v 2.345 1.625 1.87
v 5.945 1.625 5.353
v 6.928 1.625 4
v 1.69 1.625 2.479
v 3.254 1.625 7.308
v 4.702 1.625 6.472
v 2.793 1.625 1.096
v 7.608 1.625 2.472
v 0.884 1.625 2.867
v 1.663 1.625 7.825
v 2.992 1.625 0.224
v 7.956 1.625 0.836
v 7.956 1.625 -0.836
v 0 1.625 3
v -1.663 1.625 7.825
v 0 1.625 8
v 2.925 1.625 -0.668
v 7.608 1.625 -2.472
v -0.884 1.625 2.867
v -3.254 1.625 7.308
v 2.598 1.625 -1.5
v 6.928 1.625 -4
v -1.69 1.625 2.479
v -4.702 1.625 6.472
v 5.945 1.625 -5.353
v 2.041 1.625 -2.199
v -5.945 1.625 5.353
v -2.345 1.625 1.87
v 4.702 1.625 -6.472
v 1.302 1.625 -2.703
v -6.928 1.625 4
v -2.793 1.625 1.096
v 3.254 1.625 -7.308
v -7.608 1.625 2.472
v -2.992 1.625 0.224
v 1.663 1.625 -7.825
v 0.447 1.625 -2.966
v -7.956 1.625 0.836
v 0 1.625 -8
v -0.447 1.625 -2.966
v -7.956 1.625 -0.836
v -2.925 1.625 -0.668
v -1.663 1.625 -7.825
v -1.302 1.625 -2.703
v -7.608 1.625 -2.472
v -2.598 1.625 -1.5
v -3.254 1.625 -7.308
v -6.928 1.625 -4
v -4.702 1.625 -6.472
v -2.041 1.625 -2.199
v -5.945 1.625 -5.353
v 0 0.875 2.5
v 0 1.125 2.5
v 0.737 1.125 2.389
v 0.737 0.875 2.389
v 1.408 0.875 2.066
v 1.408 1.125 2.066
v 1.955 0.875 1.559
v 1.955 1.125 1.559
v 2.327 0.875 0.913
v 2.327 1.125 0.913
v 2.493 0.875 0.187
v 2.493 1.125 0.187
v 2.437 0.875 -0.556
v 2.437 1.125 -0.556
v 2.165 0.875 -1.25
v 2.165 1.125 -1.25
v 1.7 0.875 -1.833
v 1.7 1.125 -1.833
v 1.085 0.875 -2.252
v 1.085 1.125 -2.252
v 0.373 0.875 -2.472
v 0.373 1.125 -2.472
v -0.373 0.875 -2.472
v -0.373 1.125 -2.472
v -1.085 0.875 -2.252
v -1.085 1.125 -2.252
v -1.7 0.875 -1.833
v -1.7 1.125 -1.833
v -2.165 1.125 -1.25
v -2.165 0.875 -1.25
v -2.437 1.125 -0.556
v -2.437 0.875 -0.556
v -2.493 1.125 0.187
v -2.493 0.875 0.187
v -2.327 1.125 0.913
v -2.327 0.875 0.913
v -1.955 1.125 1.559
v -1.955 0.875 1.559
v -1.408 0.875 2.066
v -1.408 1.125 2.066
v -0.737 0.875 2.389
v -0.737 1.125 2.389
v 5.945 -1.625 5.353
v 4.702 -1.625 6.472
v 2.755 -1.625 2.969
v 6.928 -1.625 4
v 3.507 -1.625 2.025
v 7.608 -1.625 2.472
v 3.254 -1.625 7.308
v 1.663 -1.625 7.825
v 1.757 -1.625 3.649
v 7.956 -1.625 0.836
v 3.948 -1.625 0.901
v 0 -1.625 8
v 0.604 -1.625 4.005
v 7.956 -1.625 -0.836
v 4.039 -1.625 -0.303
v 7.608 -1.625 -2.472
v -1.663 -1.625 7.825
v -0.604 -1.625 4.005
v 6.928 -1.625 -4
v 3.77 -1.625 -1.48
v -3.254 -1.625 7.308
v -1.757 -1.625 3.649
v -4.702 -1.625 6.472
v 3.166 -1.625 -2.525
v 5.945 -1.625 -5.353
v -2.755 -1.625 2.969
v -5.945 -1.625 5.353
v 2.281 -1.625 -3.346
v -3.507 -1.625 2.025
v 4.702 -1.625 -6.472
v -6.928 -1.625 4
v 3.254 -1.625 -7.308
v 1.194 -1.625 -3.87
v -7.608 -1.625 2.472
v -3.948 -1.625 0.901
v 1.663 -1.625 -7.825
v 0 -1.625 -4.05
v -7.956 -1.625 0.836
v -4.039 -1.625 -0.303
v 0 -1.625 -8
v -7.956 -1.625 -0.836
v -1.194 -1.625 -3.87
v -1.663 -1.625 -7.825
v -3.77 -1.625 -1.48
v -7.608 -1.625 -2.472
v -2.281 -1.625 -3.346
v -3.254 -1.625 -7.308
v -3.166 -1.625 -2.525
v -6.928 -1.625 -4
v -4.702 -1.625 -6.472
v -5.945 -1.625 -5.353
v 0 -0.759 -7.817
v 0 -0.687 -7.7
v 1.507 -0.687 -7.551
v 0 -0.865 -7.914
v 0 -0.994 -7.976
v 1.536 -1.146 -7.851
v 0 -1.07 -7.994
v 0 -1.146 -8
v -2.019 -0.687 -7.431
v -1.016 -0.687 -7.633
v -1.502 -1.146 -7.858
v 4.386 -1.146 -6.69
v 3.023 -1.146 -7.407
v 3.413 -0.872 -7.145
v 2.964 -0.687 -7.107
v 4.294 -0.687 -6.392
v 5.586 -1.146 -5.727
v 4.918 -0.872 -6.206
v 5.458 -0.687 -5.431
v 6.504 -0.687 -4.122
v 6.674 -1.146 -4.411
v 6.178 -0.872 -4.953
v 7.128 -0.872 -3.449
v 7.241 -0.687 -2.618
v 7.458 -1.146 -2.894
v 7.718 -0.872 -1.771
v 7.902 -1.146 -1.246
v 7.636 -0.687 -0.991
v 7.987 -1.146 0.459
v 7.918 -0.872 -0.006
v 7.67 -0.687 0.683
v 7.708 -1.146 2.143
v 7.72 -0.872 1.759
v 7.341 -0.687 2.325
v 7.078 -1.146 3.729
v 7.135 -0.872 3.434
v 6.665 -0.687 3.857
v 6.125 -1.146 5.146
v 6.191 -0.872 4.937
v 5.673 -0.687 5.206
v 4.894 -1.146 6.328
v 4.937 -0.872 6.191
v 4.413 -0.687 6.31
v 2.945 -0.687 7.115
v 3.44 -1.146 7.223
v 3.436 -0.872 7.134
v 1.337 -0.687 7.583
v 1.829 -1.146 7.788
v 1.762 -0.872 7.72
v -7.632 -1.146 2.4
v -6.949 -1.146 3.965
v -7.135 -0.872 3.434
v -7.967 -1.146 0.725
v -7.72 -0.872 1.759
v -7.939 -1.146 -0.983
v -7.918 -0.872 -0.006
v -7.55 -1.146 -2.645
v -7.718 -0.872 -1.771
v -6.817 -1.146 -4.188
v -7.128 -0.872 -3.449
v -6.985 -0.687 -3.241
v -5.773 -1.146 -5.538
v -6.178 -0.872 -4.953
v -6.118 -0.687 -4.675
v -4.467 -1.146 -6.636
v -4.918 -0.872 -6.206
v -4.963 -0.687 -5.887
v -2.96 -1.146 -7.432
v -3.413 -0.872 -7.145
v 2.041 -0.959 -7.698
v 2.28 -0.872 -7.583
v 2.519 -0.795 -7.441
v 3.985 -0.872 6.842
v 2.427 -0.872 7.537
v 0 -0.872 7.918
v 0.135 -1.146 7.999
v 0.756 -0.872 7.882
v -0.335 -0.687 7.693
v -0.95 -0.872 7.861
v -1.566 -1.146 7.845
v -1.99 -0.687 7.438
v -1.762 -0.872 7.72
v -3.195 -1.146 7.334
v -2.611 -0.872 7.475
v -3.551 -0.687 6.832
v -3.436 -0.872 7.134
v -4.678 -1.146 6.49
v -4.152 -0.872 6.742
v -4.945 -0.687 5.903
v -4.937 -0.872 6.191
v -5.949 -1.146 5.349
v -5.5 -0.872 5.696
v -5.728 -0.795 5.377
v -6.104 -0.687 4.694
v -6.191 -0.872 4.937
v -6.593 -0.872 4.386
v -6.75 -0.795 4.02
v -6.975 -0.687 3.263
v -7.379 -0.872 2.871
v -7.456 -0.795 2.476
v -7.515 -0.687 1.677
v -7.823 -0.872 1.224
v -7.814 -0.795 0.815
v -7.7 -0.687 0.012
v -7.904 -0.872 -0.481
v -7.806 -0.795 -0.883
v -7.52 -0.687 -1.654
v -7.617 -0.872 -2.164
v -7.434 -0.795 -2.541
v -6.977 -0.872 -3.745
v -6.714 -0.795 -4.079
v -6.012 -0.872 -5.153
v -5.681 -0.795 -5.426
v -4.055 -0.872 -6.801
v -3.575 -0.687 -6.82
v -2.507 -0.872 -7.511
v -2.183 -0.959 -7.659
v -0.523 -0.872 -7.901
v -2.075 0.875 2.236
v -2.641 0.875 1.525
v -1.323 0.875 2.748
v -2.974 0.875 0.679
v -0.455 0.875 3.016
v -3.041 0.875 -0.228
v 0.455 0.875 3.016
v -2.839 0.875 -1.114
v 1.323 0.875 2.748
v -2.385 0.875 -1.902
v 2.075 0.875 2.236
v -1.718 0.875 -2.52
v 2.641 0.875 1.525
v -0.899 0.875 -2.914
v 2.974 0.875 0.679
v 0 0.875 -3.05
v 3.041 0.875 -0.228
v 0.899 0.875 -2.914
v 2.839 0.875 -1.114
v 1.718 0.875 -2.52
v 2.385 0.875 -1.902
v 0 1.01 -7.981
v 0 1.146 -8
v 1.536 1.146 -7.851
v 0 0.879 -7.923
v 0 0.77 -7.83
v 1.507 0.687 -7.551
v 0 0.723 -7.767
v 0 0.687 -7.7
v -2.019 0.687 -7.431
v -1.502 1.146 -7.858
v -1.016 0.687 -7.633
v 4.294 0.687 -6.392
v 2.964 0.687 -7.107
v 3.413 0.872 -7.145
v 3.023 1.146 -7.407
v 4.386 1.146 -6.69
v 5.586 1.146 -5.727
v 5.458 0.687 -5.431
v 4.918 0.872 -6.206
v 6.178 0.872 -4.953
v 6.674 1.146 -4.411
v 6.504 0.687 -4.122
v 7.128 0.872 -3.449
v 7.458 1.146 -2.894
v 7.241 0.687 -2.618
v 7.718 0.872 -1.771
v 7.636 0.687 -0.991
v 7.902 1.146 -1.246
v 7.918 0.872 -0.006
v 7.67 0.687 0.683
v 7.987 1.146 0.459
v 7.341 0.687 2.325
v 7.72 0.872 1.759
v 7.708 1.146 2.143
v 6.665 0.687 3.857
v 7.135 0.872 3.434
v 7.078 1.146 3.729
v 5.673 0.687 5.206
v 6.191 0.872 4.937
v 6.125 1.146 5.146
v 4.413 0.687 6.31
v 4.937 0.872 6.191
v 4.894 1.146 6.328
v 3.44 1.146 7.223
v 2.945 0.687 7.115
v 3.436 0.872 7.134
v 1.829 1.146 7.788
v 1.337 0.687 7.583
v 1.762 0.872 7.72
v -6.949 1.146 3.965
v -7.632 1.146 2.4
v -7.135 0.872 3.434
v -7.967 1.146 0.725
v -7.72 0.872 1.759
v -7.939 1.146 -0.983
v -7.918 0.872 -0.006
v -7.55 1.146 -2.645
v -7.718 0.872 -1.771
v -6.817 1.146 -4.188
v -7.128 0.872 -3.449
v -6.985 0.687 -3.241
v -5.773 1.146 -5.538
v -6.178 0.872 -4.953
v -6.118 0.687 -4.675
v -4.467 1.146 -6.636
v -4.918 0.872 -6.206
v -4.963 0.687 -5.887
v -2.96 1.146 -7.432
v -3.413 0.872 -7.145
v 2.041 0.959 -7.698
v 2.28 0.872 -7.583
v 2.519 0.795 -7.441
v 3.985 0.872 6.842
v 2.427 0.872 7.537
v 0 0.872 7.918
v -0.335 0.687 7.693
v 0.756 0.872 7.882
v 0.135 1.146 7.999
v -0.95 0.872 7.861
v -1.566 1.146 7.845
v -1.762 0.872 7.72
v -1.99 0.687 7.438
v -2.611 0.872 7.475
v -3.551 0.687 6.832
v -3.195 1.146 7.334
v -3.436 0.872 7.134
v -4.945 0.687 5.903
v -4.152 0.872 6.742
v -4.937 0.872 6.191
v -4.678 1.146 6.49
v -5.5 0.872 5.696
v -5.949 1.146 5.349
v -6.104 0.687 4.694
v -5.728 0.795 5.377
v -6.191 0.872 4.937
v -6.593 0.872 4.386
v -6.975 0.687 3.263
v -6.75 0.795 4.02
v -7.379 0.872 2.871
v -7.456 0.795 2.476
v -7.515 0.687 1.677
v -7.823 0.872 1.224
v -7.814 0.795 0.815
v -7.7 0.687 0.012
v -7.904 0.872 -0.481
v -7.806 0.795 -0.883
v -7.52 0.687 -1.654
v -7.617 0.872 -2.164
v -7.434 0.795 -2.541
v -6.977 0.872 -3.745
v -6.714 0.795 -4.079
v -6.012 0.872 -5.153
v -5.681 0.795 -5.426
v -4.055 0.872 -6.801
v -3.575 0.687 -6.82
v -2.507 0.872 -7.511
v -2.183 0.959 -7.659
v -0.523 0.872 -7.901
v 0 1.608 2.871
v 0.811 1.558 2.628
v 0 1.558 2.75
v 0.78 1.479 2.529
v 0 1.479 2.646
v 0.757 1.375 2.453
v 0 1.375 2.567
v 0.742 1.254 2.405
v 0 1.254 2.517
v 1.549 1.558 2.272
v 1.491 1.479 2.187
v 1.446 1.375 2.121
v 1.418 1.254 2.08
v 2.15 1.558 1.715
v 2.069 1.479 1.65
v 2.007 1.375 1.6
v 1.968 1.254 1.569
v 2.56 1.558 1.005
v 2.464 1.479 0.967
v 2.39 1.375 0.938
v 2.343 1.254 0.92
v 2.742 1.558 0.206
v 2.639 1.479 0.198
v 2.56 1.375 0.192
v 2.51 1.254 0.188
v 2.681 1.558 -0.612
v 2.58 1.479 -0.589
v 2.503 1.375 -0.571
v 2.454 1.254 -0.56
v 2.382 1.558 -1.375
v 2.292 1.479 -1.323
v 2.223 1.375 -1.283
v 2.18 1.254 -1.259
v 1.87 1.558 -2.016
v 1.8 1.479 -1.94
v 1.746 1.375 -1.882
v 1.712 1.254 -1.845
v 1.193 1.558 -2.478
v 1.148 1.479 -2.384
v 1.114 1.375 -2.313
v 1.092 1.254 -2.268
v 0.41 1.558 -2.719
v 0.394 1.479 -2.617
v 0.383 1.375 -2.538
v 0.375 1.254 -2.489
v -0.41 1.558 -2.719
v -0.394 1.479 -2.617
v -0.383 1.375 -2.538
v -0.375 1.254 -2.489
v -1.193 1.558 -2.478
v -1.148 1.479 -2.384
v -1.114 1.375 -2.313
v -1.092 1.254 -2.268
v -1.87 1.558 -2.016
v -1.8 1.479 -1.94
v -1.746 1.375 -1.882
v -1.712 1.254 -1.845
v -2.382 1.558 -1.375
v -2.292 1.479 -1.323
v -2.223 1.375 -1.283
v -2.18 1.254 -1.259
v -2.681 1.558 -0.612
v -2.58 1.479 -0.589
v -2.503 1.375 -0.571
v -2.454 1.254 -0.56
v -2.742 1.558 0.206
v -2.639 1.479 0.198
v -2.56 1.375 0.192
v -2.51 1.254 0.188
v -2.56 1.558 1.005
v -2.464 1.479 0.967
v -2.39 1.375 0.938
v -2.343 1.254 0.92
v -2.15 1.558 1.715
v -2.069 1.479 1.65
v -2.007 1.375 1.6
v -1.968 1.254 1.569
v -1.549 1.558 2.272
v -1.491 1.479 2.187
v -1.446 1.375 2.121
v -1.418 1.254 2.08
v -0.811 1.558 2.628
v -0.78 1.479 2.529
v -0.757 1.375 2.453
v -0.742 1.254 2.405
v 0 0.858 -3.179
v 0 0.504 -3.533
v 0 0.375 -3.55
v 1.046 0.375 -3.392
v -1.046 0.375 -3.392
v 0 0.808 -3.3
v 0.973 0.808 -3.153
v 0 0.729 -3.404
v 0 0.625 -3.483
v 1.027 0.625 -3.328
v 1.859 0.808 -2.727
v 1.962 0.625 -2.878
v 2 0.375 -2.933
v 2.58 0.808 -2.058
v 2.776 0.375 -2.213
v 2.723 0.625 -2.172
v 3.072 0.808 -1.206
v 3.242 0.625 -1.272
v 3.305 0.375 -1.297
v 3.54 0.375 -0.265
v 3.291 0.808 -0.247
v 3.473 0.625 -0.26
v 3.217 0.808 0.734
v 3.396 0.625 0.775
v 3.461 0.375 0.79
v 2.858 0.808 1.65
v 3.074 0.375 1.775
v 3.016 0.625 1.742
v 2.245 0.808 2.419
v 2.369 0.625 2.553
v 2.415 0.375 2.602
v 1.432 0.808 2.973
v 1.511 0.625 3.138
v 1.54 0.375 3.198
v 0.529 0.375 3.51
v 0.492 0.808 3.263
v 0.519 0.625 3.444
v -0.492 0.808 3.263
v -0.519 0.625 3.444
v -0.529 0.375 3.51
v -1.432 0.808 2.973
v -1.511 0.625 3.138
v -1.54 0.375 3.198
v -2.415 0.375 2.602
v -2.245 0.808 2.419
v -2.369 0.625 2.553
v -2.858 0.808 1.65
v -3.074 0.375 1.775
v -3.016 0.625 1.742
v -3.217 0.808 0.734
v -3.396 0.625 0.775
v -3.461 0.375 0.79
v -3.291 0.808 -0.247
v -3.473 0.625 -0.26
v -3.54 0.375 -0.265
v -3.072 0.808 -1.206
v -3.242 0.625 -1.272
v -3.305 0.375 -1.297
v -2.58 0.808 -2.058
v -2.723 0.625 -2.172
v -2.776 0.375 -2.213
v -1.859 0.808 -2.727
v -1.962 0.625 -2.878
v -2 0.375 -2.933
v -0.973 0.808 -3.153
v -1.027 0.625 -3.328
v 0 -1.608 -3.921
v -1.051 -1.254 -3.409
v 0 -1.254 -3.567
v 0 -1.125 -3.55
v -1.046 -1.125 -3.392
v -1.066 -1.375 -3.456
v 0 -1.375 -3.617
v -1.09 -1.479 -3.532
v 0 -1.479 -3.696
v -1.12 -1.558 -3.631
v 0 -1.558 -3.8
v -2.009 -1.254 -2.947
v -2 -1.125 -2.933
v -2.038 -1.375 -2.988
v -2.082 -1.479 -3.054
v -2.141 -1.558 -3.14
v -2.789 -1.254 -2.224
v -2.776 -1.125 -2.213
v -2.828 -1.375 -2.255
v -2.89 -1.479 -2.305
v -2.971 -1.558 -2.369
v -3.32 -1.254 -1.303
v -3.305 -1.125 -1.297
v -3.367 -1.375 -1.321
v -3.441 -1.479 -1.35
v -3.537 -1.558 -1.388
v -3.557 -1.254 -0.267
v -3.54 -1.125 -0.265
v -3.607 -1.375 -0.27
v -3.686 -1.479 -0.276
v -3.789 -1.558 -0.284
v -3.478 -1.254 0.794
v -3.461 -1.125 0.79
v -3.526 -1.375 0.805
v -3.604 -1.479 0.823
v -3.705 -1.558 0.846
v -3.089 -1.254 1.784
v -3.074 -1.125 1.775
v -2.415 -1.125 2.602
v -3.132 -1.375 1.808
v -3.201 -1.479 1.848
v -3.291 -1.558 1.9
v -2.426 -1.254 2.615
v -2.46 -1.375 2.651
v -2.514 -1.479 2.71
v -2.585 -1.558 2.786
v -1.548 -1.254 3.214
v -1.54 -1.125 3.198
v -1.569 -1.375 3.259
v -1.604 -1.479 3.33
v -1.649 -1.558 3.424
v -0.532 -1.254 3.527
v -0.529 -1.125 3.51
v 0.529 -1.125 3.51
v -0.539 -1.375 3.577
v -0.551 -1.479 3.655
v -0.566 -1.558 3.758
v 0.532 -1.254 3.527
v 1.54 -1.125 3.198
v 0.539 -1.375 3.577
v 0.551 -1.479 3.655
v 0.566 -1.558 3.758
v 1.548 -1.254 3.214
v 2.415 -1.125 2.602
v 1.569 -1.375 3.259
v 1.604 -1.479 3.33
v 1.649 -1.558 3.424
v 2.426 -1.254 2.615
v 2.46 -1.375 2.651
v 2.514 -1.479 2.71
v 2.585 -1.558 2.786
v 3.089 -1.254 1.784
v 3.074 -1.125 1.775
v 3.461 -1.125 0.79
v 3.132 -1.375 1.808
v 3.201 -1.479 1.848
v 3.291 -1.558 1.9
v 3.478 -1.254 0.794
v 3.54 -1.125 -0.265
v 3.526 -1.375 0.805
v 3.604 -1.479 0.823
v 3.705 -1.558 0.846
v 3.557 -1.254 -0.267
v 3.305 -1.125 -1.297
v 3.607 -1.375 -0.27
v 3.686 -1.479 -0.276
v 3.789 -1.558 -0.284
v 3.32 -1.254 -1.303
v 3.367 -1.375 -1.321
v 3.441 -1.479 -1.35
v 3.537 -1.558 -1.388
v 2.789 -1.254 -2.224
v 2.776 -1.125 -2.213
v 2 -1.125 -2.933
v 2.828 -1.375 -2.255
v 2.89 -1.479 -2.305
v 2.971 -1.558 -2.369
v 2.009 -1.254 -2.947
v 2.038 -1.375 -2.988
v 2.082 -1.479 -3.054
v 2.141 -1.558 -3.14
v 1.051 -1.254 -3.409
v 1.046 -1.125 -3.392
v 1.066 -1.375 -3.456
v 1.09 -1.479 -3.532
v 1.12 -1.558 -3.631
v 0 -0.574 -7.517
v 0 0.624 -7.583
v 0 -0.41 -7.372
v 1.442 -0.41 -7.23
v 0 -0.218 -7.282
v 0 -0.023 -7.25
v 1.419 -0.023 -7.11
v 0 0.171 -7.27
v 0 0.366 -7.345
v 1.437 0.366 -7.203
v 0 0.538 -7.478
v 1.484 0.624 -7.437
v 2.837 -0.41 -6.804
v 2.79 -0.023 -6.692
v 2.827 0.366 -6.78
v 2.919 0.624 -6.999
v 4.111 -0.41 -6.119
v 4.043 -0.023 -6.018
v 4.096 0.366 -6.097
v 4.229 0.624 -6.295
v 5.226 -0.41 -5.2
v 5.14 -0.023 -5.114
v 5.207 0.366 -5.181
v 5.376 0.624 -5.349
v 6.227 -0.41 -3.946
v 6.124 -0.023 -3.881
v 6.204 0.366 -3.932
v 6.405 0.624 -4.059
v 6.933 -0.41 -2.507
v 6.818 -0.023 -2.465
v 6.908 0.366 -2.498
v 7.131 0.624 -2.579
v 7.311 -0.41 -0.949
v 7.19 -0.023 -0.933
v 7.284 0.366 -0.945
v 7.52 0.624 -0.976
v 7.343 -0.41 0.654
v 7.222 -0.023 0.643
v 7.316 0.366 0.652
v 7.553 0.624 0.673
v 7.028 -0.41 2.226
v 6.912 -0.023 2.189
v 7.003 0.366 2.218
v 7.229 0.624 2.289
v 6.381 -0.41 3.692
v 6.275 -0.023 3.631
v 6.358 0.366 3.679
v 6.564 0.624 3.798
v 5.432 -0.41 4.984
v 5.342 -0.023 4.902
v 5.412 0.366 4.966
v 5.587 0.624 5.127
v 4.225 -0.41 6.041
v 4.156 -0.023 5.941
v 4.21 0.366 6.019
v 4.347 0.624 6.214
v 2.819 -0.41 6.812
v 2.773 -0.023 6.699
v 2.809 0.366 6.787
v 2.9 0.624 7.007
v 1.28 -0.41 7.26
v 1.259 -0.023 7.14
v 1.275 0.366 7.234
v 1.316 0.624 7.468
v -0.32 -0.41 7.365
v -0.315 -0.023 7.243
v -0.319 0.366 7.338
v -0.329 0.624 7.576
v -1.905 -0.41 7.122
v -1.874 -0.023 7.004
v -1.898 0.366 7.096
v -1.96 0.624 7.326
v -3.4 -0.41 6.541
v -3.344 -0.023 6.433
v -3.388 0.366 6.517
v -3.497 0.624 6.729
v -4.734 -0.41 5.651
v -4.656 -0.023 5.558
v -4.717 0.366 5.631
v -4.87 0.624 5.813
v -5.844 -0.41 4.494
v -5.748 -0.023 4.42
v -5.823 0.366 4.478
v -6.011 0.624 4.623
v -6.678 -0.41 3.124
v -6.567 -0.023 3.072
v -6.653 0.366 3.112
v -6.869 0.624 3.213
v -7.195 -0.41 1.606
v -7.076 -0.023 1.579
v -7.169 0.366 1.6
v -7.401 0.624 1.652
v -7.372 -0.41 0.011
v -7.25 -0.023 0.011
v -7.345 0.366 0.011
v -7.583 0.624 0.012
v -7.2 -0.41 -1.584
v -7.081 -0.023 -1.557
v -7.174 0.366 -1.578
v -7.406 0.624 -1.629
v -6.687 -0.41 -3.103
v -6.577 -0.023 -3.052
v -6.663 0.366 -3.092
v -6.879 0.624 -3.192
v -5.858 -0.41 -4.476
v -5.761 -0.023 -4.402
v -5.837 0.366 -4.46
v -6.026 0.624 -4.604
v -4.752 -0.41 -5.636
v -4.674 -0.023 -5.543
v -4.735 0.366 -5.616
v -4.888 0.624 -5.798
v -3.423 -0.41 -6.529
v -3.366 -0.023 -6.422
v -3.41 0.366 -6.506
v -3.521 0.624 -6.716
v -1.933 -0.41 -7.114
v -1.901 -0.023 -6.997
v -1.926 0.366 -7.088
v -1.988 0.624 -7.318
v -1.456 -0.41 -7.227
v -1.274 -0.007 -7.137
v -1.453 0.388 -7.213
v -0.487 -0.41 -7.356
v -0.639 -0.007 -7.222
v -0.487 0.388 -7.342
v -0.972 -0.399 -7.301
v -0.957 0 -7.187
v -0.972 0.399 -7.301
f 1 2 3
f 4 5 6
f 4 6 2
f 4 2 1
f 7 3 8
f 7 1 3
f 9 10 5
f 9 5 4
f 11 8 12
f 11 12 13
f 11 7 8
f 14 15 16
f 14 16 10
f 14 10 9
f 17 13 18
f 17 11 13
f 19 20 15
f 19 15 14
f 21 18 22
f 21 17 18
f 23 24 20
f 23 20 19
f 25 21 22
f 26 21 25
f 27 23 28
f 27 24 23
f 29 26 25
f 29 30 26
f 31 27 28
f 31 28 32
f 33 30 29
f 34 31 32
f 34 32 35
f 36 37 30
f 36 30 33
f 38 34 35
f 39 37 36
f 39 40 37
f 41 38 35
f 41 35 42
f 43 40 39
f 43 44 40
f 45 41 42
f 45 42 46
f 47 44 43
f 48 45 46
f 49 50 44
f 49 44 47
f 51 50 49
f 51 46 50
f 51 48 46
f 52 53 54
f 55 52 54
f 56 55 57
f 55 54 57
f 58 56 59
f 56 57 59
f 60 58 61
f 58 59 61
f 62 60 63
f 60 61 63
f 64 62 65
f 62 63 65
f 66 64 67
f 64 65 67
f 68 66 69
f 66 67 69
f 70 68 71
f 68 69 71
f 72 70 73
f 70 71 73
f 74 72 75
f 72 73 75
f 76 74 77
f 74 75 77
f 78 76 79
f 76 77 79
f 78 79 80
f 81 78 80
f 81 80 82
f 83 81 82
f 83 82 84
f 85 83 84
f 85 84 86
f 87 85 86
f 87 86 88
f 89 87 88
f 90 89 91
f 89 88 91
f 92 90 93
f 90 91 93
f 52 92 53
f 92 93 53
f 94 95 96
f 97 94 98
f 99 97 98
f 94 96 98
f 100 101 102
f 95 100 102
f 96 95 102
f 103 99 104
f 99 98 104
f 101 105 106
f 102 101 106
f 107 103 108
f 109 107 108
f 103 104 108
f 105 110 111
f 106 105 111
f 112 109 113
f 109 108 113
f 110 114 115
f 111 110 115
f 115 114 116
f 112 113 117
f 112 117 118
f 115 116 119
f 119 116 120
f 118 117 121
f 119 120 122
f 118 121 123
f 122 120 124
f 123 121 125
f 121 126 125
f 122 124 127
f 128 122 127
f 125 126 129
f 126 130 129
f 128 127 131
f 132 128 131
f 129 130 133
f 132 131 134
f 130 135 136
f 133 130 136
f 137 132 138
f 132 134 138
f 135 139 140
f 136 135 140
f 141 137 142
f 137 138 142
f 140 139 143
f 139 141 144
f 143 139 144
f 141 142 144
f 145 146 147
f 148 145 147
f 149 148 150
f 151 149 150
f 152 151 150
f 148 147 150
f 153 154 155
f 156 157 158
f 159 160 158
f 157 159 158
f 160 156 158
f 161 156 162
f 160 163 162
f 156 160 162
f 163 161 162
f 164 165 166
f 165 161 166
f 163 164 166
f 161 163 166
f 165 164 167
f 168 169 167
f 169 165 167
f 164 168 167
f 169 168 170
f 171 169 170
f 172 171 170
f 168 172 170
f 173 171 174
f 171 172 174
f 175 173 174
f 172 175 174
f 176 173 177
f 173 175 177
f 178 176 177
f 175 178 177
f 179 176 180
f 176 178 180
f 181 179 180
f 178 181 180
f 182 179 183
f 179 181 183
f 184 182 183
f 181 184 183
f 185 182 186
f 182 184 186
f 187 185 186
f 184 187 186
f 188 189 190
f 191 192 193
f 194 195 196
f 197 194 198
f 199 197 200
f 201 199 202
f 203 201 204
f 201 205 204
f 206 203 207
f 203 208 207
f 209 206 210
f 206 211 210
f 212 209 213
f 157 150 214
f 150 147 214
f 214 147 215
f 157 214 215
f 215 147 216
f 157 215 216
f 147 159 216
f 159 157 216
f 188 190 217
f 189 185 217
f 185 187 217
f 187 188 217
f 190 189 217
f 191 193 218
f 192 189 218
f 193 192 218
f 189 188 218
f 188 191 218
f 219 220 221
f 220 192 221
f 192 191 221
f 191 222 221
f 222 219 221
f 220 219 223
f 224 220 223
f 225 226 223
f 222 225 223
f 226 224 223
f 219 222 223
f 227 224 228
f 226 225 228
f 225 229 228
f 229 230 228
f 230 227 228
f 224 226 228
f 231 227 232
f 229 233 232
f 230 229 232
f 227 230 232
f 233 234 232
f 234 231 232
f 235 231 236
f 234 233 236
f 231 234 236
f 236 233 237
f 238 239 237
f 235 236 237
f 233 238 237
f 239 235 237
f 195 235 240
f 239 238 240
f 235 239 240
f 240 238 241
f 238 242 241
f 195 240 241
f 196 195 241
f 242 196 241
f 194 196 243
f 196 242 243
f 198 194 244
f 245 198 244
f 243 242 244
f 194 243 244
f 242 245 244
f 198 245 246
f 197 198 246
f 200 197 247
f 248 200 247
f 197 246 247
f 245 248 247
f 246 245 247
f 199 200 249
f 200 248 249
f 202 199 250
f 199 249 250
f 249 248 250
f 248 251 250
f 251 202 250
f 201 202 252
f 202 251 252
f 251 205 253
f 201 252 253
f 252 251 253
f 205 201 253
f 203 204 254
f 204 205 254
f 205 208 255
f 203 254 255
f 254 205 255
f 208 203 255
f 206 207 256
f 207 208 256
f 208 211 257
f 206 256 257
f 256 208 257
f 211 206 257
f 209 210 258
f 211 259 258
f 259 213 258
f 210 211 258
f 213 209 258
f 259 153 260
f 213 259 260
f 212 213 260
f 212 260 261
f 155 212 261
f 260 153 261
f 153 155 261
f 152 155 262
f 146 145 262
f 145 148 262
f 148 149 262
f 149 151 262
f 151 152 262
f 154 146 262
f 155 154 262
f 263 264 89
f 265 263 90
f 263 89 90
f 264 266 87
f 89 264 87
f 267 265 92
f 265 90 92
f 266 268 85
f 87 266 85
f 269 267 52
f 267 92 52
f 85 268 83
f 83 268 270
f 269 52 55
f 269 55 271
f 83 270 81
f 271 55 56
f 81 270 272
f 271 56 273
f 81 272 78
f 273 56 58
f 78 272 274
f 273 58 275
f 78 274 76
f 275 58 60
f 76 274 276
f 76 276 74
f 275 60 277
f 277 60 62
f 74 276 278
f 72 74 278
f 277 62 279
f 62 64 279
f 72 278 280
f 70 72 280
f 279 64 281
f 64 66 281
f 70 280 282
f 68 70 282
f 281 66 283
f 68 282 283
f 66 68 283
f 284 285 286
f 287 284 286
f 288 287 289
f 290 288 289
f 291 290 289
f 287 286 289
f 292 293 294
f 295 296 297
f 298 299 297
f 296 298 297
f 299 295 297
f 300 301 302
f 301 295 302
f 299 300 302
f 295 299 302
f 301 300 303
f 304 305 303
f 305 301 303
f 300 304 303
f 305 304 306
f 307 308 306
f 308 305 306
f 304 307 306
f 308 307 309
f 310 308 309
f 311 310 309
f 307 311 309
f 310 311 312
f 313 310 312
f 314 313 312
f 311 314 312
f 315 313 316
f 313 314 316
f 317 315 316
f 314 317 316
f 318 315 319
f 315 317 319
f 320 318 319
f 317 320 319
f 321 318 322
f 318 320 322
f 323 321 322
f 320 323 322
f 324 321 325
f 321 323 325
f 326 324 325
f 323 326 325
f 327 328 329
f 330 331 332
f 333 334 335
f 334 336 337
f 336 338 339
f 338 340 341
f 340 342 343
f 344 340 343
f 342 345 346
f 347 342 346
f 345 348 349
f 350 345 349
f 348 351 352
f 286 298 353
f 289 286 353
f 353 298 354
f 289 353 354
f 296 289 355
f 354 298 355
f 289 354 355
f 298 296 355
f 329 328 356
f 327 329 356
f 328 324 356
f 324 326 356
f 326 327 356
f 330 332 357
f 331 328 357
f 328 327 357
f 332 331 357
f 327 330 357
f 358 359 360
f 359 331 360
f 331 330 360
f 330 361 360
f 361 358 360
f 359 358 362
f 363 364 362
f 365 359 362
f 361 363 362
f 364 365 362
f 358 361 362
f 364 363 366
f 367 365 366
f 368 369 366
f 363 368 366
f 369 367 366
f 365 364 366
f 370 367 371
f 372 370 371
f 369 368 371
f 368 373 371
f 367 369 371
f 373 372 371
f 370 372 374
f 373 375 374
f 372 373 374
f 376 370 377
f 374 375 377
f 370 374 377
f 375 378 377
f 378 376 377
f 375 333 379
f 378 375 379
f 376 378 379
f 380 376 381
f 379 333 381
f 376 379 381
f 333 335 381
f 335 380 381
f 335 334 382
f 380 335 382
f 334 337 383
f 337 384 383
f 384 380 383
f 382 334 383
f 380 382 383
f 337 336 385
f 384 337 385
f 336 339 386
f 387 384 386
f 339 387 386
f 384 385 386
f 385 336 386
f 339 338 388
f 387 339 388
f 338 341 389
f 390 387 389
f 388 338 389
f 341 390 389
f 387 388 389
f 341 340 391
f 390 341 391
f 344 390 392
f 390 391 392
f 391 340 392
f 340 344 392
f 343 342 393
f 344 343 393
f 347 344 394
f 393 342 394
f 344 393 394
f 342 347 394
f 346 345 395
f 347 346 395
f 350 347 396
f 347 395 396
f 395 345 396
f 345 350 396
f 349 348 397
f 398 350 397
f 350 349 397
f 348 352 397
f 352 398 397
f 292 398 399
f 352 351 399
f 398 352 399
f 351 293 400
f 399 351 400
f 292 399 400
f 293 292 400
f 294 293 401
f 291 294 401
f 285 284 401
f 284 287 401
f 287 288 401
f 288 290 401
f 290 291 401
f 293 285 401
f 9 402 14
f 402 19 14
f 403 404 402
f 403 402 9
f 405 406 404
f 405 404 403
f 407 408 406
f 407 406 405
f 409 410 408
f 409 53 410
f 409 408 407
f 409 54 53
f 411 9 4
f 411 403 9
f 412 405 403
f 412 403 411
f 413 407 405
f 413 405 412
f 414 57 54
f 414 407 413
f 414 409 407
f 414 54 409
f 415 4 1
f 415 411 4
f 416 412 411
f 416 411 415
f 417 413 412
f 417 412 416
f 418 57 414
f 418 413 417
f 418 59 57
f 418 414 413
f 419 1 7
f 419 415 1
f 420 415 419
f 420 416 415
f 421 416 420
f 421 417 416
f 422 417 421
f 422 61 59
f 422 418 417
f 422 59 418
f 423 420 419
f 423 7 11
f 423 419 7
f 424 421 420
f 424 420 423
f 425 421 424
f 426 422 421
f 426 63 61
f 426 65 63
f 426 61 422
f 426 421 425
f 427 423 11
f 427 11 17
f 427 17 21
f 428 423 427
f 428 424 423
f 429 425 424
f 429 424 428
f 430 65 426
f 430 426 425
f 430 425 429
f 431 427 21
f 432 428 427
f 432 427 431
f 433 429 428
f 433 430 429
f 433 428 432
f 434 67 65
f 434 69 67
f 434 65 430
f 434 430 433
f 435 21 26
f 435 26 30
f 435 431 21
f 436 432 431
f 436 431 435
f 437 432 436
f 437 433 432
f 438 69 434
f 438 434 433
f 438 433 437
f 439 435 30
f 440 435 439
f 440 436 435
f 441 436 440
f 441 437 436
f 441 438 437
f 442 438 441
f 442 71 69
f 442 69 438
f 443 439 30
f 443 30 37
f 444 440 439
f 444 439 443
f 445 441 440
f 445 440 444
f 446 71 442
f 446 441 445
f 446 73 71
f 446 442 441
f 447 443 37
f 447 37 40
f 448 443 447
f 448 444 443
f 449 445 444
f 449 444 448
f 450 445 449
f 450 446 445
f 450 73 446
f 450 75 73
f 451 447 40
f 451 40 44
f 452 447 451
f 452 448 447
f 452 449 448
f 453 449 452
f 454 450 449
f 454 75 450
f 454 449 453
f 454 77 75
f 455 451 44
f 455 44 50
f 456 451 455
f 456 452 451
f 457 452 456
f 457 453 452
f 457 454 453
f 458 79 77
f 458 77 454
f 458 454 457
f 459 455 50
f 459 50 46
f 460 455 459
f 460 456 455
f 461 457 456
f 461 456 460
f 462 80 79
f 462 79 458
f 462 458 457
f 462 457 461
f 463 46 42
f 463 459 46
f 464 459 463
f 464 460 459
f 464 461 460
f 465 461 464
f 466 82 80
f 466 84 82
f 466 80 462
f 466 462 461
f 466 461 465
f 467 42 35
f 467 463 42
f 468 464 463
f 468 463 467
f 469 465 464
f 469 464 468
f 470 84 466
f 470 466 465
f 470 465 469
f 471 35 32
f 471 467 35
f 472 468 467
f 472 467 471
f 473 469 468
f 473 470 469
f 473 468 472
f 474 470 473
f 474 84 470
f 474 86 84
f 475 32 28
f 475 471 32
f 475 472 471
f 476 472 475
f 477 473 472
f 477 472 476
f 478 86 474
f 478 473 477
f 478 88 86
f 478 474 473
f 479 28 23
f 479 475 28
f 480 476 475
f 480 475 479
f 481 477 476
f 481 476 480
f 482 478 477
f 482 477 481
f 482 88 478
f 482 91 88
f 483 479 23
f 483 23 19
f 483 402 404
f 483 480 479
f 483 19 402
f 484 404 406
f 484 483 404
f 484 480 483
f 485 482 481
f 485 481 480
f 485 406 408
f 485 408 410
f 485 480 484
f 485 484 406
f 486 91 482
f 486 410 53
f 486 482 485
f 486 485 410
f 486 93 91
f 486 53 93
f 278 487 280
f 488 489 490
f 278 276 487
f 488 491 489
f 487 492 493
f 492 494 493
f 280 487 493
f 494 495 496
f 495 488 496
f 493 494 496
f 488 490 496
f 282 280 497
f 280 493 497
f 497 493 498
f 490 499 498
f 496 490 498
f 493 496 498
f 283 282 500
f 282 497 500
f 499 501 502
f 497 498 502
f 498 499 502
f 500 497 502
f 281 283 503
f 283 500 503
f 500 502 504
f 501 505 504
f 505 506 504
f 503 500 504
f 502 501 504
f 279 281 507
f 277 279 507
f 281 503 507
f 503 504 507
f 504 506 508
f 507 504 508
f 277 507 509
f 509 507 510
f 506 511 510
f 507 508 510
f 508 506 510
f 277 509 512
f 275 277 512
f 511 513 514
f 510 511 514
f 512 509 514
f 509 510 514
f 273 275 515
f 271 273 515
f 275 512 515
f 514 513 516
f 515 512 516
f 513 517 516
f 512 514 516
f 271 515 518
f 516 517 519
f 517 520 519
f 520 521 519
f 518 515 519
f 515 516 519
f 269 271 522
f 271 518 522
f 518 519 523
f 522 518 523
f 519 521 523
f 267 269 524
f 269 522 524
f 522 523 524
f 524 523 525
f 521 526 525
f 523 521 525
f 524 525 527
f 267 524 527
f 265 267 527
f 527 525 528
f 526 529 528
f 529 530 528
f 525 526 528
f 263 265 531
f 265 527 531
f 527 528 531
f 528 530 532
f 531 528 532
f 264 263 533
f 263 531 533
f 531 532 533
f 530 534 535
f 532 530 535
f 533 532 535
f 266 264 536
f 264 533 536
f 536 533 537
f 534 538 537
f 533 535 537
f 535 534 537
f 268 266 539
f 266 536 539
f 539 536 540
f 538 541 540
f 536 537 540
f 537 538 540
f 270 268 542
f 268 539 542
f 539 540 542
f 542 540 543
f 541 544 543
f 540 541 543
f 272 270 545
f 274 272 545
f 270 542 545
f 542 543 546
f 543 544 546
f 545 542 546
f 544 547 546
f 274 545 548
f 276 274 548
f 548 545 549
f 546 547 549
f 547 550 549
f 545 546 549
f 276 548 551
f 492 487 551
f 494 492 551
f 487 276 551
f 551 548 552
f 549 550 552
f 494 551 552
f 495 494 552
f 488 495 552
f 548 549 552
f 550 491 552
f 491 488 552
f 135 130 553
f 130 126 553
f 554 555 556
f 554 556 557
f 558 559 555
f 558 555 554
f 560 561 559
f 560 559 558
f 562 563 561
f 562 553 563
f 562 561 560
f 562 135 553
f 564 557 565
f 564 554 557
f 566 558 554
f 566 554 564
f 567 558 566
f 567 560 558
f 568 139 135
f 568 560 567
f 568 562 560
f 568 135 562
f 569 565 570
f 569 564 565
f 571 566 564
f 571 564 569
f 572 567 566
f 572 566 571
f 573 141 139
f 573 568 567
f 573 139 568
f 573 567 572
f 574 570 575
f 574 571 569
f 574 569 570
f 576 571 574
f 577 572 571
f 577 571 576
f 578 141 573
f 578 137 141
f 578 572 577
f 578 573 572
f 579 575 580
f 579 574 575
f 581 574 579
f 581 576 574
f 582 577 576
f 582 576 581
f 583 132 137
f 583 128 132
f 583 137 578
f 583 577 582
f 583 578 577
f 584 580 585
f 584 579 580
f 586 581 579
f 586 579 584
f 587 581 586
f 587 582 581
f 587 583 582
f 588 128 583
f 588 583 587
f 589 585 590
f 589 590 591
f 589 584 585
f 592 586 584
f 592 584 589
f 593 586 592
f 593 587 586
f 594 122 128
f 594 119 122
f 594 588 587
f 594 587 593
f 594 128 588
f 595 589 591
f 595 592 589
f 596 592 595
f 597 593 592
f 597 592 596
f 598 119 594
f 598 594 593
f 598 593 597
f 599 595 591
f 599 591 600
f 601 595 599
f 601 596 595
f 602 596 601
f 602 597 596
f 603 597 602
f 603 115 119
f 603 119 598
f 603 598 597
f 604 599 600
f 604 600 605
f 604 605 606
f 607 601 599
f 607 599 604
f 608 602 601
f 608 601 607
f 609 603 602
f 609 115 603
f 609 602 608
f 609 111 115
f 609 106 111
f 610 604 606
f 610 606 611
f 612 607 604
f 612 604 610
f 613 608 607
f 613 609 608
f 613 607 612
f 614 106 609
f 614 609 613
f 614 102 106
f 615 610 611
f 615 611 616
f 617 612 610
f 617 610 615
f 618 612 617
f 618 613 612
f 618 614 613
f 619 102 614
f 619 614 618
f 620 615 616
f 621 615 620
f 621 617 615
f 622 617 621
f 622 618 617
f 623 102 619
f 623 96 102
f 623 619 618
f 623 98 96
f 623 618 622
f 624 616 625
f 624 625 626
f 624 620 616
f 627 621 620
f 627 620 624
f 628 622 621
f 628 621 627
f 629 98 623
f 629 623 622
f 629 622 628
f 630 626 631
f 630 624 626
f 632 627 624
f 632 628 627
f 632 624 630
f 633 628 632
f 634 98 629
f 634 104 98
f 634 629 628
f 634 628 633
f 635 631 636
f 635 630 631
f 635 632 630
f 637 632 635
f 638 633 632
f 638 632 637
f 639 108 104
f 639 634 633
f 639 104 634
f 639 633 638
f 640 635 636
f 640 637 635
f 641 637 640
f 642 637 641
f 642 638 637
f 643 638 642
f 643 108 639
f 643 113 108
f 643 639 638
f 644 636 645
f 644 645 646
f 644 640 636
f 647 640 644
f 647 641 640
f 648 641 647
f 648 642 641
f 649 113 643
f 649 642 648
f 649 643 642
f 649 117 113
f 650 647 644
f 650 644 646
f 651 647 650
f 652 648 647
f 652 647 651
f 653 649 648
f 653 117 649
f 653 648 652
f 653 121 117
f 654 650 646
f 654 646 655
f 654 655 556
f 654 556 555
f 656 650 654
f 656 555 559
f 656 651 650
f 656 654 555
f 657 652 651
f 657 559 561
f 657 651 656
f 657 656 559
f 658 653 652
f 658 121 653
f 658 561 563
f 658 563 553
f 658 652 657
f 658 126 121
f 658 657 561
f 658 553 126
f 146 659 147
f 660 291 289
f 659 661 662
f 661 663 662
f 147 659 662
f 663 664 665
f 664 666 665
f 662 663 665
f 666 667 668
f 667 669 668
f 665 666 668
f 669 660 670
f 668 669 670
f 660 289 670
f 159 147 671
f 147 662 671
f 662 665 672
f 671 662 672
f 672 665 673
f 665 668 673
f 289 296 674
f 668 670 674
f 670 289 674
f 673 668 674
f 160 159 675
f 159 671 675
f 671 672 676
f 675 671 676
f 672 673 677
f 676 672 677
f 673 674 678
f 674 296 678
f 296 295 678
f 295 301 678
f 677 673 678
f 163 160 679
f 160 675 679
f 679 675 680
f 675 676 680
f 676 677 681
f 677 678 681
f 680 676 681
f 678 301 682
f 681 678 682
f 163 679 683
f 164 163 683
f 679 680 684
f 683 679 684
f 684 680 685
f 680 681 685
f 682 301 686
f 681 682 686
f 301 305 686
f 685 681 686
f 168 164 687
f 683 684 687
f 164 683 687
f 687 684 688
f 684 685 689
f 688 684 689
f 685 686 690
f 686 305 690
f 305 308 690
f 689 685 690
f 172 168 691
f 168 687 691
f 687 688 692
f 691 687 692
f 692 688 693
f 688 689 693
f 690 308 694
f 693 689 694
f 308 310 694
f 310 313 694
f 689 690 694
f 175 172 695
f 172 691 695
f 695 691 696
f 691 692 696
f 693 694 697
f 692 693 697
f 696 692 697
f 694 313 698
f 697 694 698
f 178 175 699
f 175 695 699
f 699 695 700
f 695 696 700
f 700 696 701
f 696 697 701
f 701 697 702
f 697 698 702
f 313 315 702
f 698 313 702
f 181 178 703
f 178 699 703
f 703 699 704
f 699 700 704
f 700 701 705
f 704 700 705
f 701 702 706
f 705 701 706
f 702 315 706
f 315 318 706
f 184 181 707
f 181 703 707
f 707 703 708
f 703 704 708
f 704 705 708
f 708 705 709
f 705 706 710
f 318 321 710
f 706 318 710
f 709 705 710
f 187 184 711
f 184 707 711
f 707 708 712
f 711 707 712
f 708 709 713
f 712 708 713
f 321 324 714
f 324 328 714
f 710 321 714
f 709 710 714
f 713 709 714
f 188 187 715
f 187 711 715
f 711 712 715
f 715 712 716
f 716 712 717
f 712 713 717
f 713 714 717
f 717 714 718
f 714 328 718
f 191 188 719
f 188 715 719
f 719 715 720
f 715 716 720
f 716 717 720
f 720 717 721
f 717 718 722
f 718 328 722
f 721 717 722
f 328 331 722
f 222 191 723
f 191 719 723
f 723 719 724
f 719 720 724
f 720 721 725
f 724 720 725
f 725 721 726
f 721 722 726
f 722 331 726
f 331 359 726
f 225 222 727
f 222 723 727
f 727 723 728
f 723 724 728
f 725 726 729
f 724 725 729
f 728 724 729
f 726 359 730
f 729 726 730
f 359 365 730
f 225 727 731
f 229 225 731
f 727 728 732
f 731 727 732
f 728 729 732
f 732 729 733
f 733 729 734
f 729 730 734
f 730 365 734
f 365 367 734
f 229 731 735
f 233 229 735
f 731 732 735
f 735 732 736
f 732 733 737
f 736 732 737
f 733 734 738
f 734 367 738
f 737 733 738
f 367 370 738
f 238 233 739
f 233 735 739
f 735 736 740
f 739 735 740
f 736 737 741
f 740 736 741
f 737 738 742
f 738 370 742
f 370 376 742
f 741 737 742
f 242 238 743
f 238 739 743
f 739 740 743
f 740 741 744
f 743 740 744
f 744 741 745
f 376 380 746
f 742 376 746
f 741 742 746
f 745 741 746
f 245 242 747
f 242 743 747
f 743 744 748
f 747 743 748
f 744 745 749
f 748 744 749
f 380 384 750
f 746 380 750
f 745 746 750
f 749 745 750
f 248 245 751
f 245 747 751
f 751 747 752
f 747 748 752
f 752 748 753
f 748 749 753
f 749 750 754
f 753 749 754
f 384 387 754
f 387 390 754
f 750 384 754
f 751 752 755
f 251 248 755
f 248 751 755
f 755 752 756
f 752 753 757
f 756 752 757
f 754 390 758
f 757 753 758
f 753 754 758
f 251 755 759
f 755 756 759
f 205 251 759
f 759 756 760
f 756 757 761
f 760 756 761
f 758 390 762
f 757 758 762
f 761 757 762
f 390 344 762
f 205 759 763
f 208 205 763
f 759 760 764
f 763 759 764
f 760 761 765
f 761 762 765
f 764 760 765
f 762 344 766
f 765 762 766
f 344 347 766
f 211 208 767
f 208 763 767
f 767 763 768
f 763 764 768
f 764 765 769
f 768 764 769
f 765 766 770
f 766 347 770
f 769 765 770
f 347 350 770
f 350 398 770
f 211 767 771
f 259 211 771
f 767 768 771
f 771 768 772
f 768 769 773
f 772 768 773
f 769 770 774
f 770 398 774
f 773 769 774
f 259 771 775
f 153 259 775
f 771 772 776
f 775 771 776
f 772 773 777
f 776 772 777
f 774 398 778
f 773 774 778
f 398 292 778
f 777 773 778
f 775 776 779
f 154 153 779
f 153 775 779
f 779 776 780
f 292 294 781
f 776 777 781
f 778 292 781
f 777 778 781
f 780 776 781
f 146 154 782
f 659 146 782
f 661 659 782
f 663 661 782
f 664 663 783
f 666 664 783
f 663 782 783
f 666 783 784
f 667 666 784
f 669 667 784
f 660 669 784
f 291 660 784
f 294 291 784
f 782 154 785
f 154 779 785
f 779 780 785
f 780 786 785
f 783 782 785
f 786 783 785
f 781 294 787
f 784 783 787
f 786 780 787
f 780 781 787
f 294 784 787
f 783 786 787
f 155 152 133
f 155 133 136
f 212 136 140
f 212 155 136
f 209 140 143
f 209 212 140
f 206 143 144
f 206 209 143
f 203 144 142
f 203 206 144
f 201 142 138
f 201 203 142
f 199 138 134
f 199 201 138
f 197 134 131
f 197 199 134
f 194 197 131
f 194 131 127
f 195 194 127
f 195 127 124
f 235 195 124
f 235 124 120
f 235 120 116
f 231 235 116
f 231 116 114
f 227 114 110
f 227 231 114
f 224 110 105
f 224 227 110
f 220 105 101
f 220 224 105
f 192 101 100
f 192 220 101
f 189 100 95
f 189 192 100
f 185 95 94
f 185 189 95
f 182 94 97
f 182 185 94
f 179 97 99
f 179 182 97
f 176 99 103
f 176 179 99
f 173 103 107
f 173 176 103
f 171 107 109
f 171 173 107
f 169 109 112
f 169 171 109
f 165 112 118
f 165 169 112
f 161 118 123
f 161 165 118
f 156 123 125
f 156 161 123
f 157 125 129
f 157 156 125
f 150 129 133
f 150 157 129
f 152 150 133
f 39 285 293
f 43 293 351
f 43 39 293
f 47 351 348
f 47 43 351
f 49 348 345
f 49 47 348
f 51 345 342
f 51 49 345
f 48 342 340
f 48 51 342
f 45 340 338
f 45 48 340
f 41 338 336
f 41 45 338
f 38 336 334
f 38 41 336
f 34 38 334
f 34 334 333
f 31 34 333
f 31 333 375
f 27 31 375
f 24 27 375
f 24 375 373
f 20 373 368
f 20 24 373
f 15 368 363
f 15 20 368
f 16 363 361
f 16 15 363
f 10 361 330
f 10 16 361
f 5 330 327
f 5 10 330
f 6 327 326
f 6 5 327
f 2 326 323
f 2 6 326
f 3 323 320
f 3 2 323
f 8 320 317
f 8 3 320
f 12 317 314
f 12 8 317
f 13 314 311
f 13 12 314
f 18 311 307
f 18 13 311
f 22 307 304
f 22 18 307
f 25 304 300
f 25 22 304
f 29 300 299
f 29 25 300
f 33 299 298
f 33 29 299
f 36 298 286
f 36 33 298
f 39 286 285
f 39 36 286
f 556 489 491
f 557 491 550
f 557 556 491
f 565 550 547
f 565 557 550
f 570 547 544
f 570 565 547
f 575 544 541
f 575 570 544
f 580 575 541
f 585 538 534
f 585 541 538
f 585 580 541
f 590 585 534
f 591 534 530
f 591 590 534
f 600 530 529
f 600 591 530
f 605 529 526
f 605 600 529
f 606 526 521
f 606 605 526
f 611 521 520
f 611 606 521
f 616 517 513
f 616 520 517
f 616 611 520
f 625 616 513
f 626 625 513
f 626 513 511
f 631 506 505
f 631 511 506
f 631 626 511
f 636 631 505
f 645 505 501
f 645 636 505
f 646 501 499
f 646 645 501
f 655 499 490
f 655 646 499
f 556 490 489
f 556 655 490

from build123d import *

# Parameters (mm, degrees)
SKETCH1_R           = 8
SKETCH1_R_2         = 3.55
BOSS_EXTRUDE1_DEPTH = 1.625
SKETCH3_R           = 4
SKETCH3_R_2         = 2.5
BOSS_EXTRUDE2_DEPTH = 0.75
FILLET1_R           = 0.5


with BuildPart() as part:
    # Sketch1 → Boss-Extrude1 (new, symmetric)
    with BuildSketch(Plane(origin=(0, 0, 0), x_dir=(1, 0, 0), z_dir=(0, 1, 0))):
        with Locations(Location((0, 0, 0), (0, 0, 90))):
            Circle(SKETCH1_R)
        with Locations(Location((0, 0, 0), (0, 0, 90))):
            Circle(SKETCH1_R_2, mode=Mode.SUBTRACT)
    extrude(amount=BOSS_EXTRUDE1_DEPTH, both=True)

    # Sketch2 → Cut-Revolve1 (revolve, cut)
    with BuildSketch(Plane(origin=(0, 0, 0), x_dir=(0, 0, -1), z_dir=(1, 0, 0)), mode=Mode.PRIVATE) as cut_revolve1_sk:
        with BuildLine():
            Line((-8, 0.75), (-8, -0.75))
            add(Edge.make_bspline(
                [(-8, -0.75), (-7.25, -0.75), (-7.25, 0), (-7.25, 0.75), (-8, 0.75)],
                knots=[4.71238898, 4.71238898, 4.71238898, 6.283185307, 6.283185307, 7.853981634, 7.853981634, 7.853981634], degree=2, weights=[1, 0.707106781, 1, 0.707106781, 1]))
        make_face()
    revolve(cut_revolve1_sk.sketch.rotate(Axis((0, 1.625, 0), (0, -1, 0)), 180), axis=Axis((0, 1.625, 0), (0, -1, 0)), mode=Mode.SUBTRACT)

    # Sketch3 → Boss-Extrude2 (add)
    with BuildSketch(Plane(origin=(0, 1.625, 0), x_dir=(1, 0, 0), z_dir=(0, 1, 0))):
        Circle(SKETCH3_R)
        with Locations(Location((0, 0, 0), (0, 0, 270))):
            Circle(SKETCH3_R_2, mode=Mode.SUBTRACT)
    extrude(amount=-BOSS_EXTRUDE2_DEPTH)

    # Fillet1
    fillet1_edges = [part.edges().sort_by_distance(p)[0] for p in [
        (0, 0.75, 8),
        (0, -0.75, 8),
        (0, 0.875, 3.55),
        (0, 1.625, -2.5),
        (0, -1.625, 3.55),
    ]]
    fillet(fillet1_edges, radius=FILLET1_R)


solid = part.part
